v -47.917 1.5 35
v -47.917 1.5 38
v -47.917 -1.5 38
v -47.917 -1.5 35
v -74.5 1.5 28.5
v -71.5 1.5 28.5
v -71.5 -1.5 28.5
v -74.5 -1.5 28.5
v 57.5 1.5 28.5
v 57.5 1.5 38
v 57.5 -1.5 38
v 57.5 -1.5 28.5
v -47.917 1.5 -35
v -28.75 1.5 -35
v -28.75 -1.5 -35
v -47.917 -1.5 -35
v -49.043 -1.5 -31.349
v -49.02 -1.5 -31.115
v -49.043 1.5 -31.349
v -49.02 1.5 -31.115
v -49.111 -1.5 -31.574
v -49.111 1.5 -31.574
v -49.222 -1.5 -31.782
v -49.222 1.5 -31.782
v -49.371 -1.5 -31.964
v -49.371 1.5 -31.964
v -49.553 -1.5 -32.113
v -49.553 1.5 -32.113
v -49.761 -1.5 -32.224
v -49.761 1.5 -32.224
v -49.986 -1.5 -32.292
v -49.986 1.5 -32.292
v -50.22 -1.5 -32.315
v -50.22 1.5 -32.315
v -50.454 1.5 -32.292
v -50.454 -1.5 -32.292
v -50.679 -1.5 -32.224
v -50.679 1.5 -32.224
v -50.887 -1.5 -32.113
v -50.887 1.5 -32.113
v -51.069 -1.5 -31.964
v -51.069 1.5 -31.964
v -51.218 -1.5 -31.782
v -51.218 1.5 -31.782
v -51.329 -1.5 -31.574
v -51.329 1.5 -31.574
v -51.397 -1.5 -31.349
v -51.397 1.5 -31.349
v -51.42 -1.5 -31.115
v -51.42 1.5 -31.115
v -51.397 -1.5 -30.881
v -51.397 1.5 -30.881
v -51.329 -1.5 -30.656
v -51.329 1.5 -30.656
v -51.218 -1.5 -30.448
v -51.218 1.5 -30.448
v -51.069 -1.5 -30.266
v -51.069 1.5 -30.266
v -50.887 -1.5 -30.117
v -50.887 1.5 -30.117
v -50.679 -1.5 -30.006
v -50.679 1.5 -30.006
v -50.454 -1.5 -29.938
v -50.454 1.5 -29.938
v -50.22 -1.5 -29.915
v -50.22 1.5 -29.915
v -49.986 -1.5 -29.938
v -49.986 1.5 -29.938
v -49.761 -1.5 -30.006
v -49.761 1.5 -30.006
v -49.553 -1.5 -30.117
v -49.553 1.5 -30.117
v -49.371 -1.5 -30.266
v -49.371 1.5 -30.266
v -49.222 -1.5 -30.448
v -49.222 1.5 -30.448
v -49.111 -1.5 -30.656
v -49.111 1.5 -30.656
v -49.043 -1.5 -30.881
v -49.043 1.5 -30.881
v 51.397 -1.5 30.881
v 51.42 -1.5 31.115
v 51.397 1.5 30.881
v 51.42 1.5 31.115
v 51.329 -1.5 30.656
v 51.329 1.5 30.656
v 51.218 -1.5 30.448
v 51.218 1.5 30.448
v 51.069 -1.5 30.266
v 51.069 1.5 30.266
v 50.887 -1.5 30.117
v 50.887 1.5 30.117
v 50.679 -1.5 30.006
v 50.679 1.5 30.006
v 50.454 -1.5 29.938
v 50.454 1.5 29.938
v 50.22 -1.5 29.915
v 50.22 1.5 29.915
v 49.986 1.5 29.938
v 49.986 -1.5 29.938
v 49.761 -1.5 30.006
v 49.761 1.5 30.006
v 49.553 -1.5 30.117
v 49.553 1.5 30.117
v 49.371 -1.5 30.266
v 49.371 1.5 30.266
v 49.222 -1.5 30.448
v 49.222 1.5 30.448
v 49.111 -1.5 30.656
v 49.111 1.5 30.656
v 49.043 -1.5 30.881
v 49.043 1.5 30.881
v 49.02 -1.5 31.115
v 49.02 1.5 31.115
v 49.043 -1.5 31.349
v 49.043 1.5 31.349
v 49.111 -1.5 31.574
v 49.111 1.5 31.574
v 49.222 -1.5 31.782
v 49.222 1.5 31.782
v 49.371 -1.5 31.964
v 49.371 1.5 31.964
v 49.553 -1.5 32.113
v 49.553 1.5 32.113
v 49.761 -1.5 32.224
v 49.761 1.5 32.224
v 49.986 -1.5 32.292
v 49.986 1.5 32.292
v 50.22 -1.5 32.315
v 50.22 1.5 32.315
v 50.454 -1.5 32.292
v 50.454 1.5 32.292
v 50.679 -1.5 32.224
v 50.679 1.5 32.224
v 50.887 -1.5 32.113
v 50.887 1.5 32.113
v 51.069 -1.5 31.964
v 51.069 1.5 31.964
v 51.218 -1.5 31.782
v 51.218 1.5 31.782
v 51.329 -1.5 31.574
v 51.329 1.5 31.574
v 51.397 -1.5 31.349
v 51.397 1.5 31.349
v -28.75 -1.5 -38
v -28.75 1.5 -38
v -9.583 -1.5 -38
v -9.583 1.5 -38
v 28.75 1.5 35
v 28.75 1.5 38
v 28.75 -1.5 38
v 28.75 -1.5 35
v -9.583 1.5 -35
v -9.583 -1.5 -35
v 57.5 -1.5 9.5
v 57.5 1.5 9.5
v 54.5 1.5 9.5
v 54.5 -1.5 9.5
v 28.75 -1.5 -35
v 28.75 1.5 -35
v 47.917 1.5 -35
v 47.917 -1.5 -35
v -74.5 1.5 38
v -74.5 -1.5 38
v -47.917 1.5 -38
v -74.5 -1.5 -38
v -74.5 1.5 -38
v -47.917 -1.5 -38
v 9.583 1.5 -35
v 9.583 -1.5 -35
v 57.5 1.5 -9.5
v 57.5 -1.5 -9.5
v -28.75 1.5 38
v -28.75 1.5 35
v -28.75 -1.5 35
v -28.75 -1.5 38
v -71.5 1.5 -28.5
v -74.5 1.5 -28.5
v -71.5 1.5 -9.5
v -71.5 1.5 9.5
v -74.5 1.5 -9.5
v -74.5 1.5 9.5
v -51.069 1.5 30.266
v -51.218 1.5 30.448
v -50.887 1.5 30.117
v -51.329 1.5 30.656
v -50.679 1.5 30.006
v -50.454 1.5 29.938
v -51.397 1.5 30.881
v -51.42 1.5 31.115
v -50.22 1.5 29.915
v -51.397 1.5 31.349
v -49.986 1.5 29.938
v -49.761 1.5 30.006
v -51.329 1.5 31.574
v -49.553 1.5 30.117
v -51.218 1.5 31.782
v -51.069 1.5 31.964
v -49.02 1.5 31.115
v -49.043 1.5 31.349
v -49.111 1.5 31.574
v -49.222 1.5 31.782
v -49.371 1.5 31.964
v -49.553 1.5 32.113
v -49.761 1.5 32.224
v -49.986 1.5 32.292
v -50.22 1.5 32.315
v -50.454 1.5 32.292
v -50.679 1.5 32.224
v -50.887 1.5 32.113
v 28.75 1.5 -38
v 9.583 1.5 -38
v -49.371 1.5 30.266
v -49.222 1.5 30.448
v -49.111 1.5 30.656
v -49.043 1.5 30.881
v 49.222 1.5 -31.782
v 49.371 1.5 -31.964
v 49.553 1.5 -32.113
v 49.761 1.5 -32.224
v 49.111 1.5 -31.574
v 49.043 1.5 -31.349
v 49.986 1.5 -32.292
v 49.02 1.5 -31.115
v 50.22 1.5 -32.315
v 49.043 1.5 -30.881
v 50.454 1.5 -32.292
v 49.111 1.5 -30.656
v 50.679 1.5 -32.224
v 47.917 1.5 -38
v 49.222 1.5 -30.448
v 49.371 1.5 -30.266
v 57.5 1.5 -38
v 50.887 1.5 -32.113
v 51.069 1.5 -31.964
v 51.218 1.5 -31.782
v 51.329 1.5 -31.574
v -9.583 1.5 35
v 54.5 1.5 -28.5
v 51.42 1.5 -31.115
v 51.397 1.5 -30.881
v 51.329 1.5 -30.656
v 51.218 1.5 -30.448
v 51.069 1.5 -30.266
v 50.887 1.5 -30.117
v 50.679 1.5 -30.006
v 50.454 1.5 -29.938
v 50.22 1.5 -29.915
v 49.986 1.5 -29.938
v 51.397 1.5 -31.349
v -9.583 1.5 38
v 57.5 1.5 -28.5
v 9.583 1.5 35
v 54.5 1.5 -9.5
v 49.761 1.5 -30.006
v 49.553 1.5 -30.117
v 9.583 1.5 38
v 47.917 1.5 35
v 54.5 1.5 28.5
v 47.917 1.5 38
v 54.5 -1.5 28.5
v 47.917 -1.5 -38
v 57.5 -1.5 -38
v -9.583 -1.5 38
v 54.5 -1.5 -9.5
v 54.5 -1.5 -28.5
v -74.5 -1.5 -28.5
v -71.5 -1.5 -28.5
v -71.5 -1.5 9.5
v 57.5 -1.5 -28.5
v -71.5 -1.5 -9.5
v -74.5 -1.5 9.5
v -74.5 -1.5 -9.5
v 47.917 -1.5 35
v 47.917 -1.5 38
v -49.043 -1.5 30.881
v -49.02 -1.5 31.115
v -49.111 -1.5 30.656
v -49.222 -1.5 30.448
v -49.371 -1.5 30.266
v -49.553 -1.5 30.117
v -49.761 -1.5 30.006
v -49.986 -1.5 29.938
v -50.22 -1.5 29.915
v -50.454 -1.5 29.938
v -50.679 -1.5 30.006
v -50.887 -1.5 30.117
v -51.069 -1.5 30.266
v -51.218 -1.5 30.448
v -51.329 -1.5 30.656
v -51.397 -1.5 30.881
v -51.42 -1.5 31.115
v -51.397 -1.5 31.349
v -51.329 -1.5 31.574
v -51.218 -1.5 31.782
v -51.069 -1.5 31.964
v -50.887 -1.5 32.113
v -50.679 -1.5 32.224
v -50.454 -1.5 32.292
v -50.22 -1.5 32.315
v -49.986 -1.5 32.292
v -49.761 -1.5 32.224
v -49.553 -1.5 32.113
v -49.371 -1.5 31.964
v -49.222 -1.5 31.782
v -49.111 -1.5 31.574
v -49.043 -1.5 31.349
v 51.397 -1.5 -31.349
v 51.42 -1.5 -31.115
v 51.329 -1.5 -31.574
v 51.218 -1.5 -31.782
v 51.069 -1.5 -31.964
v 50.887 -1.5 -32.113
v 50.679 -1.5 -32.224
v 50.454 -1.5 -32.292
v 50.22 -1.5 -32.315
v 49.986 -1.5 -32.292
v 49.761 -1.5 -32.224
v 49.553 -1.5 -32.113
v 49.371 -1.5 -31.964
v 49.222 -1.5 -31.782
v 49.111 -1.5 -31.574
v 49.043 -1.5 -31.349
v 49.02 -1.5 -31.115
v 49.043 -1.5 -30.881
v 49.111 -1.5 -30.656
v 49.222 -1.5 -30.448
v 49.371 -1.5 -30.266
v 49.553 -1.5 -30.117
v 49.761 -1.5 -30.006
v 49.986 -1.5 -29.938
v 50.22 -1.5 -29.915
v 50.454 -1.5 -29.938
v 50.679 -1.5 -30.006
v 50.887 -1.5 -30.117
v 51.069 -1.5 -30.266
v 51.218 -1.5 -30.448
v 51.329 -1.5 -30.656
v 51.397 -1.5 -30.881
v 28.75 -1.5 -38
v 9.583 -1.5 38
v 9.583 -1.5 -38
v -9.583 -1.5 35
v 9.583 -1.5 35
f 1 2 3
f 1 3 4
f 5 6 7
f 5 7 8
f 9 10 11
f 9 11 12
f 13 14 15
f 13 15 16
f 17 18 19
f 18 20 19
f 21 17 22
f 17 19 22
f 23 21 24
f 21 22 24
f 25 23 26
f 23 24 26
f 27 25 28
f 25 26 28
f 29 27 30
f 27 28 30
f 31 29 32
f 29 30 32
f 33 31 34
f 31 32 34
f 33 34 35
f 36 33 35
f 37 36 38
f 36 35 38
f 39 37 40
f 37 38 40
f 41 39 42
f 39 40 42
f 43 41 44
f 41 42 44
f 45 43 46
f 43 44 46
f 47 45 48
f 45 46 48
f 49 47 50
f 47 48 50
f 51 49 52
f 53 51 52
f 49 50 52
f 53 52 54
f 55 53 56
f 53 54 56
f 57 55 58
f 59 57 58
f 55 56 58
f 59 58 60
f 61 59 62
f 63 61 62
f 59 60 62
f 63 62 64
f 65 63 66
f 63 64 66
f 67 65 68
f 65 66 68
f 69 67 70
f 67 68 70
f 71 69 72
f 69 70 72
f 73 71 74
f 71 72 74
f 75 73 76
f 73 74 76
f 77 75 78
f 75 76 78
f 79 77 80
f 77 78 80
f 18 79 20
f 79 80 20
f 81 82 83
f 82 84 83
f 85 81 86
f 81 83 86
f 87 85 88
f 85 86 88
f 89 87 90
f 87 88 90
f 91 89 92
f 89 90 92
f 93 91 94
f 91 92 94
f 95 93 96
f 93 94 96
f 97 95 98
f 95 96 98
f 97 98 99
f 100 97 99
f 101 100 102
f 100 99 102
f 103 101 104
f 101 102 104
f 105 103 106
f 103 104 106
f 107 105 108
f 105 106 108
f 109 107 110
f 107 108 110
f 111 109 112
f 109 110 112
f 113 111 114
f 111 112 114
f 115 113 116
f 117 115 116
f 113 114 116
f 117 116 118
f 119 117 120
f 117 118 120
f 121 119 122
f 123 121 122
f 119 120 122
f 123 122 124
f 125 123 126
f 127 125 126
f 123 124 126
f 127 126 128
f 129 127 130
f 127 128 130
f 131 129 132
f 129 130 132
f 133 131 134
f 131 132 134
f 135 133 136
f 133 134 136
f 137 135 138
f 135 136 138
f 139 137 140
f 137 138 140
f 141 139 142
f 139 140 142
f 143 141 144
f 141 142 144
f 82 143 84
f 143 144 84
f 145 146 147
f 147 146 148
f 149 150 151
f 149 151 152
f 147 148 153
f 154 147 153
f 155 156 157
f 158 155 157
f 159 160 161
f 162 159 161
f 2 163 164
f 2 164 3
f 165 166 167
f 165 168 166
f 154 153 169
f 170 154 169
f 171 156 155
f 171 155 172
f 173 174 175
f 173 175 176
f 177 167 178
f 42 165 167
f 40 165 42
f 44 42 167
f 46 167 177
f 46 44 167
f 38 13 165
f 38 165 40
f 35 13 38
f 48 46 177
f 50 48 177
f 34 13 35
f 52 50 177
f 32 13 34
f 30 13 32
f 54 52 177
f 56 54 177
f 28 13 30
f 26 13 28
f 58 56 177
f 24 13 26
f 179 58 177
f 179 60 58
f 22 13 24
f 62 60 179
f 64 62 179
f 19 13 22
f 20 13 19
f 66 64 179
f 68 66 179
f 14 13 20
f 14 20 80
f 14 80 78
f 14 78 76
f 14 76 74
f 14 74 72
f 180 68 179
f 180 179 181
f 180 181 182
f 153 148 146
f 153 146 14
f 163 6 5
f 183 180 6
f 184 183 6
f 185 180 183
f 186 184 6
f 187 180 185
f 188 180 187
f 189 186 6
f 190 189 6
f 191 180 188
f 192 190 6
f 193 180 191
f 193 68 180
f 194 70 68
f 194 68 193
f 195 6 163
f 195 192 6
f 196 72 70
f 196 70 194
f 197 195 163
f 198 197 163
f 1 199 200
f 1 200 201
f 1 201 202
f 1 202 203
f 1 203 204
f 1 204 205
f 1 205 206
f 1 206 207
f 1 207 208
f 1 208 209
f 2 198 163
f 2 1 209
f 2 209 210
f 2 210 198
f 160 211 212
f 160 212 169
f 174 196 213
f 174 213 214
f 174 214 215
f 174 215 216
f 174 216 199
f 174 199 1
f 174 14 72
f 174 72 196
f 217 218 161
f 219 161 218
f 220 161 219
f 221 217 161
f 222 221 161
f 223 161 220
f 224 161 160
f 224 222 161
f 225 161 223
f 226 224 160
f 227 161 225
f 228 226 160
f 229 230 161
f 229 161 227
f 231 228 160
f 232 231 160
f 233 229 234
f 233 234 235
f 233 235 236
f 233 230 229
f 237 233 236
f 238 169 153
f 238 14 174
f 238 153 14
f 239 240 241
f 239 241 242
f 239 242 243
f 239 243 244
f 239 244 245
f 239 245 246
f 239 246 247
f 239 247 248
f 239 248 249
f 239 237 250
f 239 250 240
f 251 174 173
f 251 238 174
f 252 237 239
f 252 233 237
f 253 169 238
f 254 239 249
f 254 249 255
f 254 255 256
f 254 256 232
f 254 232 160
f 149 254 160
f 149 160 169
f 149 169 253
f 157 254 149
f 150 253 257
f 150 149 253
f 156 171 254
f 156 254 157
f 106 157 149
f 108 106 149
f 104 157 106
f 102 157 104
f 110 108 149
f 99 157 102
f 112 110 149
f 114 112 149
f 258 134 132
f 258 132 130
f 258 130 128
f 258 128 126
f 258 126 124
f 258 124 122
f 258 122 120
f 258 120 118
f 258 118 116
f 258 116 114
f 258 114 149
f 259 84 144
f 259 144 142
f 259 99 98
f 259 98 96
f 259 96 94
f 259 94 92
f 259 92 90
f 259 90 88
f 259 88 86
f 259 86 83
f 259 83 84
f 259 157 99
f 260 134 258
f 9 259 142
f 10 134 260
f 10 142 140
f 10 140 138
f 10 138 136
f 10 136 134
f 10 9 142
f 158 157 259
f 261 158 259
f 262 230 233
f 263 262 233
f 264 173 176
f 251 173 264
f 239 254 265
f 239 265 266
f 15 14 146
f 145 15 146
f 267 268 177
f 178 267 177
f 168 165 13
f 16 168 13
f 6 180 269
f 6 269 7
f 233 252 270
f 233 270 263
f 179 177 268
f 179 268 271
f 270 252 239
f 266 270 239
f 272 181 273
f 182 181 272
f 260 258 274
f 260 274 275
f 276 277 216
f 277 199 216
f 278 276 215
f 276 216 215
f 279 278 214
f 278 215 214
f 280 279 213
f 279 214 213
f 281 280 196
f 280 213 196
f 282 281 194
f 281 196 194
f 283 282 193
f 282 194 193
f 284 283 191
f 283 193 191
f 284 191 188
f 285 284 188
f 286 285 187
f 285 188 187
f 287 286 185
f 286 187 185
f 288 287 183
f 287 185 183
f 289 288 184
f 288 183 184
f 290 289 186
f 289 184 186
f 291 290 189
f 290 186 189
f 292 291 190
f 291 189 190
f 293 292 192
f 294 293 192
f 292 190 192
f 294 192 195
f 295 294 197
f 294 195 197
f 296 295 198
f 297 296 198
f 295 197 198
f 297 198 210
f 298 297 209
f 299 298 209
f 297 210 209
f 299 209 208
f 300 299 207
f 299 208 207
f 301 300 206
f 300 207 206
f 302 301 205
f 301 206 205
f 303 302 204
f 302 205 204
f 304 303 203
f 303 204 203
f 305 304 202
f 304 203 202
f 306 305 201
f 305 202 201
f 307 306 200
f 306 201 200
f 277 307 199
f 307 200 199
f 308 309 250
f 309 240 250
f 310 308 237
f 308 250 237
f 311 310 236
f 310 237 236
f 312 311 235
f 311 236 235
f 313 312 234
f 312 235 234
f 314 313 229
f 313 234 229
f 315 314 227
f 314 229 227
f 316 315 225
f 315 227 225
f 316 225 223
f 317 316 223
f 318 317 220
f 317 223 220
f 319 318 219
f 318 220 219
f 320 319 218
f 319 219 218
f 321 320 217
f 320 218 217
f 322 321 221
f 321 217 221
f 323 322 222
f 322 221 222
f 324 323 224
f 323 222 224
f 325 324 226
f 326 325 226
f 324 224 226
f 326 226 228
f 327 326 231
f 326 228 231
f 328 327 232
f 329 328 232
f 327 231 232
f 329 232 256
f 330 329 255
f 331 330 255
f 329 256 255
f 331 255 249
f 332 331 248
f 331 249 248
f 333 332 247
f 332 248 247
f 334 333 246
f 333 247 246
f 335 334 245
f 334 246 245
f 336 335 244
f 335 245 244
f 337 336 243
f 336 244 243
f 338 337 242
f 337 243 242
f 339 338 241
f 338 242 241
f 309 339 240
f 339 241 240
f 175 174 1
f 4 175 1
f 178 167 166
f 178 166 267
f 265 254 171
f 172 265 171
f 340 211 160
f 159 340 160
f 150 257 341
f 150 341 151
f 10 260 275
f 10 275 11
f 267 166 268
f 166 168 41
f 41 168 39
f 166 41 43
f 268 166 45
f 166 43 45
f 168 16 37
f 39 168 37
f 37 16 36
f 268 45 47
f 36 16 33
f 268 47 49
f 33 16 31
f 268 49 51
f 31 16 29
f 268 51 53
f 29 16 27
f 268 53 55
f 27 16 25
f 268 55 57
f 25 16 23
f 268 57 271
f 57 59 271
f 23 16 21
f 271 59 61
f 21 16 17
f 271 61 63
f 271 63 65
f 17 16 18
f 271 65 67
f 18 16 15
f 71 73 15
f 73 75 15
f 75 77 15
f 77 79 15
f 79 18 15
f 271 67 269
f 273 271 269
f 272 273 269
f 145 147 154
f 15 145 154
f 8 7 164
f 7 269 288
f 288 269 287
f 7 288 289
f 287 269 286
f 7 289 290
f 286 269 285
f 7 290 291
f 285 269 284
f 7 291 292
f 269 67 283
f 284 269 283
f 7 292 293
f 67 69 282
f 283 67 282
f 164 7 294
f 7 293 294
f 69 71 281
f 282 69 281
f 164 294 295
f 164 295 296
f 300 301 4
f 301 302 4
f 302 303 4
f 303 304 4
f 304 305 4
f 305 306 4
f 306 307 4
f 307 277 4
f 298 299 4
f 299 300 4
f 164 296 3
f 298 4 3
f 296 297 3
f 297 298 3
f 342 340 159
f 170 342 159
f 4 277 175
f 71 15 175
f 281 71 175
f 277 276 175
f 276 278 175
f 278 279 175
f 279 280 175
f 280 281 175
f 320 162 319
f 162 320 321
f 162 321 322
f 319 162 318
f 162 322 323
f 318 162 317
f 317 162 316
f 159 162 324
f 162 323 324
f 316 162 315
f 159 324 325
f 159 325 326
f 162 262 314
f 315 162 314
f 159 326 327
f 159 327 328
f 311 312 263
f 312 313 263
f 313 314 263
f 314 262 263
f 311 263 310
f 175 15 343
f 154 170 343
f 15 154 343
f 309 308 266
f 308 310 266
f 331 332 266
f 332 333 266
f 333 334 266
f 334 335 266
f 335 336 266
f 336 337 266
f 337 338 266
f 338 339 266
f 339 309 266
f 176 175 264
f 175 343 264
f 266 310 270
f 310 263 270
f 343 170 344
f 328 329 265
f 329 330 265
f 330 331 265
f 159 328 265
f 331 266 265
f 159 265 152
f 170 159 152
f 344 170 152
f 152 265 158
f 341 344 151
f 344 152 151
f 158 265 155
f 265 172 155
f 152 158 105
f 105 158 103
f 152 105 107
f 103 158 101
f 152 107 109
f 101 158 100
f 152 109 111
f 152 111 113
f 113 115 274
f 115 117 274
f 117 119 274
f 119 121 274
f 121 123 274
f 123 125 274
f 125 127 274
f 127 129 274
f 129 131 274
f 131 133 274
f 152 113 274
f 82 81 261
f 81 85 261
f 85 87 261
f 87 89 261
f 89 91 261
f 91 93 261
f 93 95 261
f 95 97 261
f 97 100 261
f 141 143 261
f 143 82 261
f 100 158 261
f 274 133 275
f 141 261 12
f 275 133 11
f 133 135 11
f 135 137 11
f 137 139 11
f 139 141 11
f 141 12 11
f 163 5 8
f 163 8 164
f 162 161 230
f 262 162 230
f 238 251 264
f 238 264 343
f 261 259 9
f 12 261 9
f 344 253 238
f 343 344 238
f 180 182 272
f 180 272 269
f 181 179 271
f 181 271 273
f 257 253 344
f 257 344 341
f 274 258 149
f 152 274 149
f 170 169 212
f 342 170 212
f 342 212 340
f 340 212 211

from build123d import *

# Parameters (mm, degrees)
CROQUIS1_W                 = 115
CROQUIS1_H                 = 76
SALIENTE_EXTRUIR1_DEPTH    = 1.5
CORTAR_EXTRUIR2_DEPTH      = 2.5
MATRIZL4_COUNT             = 3
MATRIZL4_PITCH             = 38.333333333
SIMETR_A1_COPY_1_DEPTH     = 2.5
SIMETR_A1_COPY_2_DEPTH     = 2.5
CORTAR_EXTRUIR3_DEPTH      = 2.5
MATRIZL5_COUNT             = 2
MATRIZL5_PITCH             = 38
SIMETR_A2_COPY_1_DEPTH     = 2.5
CROQUIS2_R                 = 1.2
CORTAR_EXTRUIR1_DEPTH      = 2.5
CORTAR_EXTRUIR1_DEPTH_BACK = 2.5
CROQUIS5_W                 = 9.5
CROQUIS5_H                 = 3
CROQUIS5_W_2               = 19
SALIENTE_EXTRUIR2_DEPTH    = 17
CROQUIS6_W                 = 19
CROQUIS6_H                 = 3
SALIENTE_EXTRUIR3_DEPTH    = 17


with BuildPart() as part:
    # Croquis1 → Saliente-Extruir1 (new body, symmetric)
    with BuildSketch(Plane(origin=(0, 0, 0), x_dir=(1, 0, 0), z_dir=(0, 1, 0))):
        Rectangle(CROQUIS1_W, CROQUIS1_H)
    extrude(amount=SALIENTE_EXTRUIR1_DEPTH, both=True)

    # Croquis3 → Cortar-Extruir2 (cut, symmetric)
    with BuildSketch(Plane(origin=(0, 0, 0), x_dir=(1, 0, 0), z_dir=(0, 1, 0))):
        Polygon((-47.916666667, -35), (-39.483333333, -35), (-37.183333333, -35), (-28.75, -35), (-28.75, -38), (-47.916666667, -38), align=None)
    cortar_extruir2 = extrude(amount=CORTAR_EXTRUIR2_DEPTH, both=True, mode=Mode.SUBTRACT)

    # MatrizL4: Cortar-Extruir2 ×3
    with Locations(*[(i * MATRIZL4_PITCH, 0, 0) for i in range(1, MATRIZL4_COUNT)]):
        add(cortar_extruir2, mode=Mode.SUBTRACT)

    # Simetría1: Cortar-Extruir2 across plane
    add(cortar_extruir2.mirror(Plane.XY), mode=Mode.SUBTRACT)

    # Simetría1 copy 1 sketch → Simetría1 copy 1 (cut, symmetric)
    with BuildSketch(Plane(origin=(38.333333333, 0, 0), x_dir=(1, 0, 0), z_dir=(0, 1, 0))):
        Polygon((-47.916666667, 35), (-39.483333333, 35), (-37.183333333, 35), (-28.75, 35), (-28.75, 38), (-47.916666667, 38), align=None)
    extrude(amount=SIMETR_A1_COPY_1_DEPTH, both=True, mode=Mode.SUBTRACT)

    # Simetría1 copy 2 sketch → Simetría1 copy 2 (cut, symmetric)
    with BuildSketch(Plane(origin=(76.666666667, 0, 0), x_dir=(1, 0, 0), z_dir=(0, 1, 0))):
        Polygon((-47.916666667, 35), (-39.483333333, 35), (-37.183333333, 35), (-28.75, 35), (-28.75, 38), (-47.916666667, 38), align=None)
    extrude(amount=SIMETR_A1_COPY_2_DEPTH, both=True, mode=Mode.SUBTRACT)

    # Croquis4 → Cortar-Extruir3 (cut, symmetric)
    with BuildSketch(Plane(origin=(0, 0, 0), x_dir=(1, 0, 0), z_dir=(0, 1, 0))):
        Polygon((-57.5, 28.5), (-54.5, 28.5), (-54.5, 20.15), (-54.5, 17.85), (-54.5, 9.5), (-57.5, 9.5), align=None)
    cortar_extruir3 = extrude(amount=CORTAR_EXTRUIR3_DEPTH, both=True, mode=Mode.SUBTRACT)

    # MatrizL5: Cortar-Extruir3 ×2
    with Locations(*[(0, 0, i * MATRIZL5_PITCH) for i in range(1, MATRIZL5_COUNT)]):
        add(cortar_extruir3, mode=Mode.SUBTRACT)

    # Simetría2: Cortar-Extruir3 across plane
    add(cortar_extruir3.mirror(Plane(origin=(0, 0, 0), x_dir=(0, 0, 1), z_dir=(1, 0, 0))), mode=Mode.SUBTRACT)

    # Simetría2 copy 1 sketch → Simetría2 copy 1 (cut, symmetric)
    with BuildSketch(Plane(origin=(0, 0, 38), x_dir=(-1, 0, 0), z_dir=(0, 1, 0))):
        Polygon((-57.5, -28.5), (-54.5, -28.5), (-54.5, -20.15), (-54.5, -17.85), (-54.5, -9.5), (-57.5, -9.5), align=None)
    extrude(amount=SIMETR_A2_COPY_1_DEPTH, both=True, mode=Mode.SUBTRACT)

    # Croquis2 → Cortar-Extruir1 (cut, two sides)
    with BuildSketch(Plane(origin=(0, 0, 0), x_dir=(1, 0, 0), z_dir=(0, 1, 0))) as cortar_extruir1_sk:
        with Locations((-50.22, 31.115)):
            Circle(CROQUIS2_R)
        with Locations((-50.22, -31.115)):
            Circle(CROQUIS2_R)
        with Locations((50.22, 31.115)):
            Circle(CROQUIS2_R)
        with Locations((50.22, -31.115)):
            Circle(CROQUIS2_R)
    extrude(amount=CORTAR_EXTRUIR1_DEPTH, mode=Mode.SUBTRACT)
    extrude(cortar_extruir1_sk.sketch, amount=-CORTAR_EXTRUIR1_DEPTH_BACK, mode=Mode.SUBTRACT)

    # Croquis5 → Saliente-Extruir2 (add)
    with BuildSketch(Plane.ZY.offset(57.5)):
        with Locations((-33.25, 0)):
            Rectangle(CROQUIS5_W, CROQUIS5_H)
        with Locations((33.25, 0)):
            Rectangle(CROQUIS5_W, CROQUIS5_H)
        Rectangle(CROQUIS5_W_2, CROQUIS5_H)
    extrude(amount=SALIENTE_EXTRUIR2_DEPTH)

    # Croquis6 → Saliente-Extruir3 (add)
    with BuildSketch(Plane.ZY.offset(54.5)):
        with Locations((19, 0)):
            Rectangle(CROQUIS6_W, CROQUIS6_H)
        with Locations((-19, 0)):
            Rectangle(CROQUIS6_W, CROQUIS6_H)
    extrude(amount=SALIENTE_EXTRUIR3_DEPTH)


solid = part.part
